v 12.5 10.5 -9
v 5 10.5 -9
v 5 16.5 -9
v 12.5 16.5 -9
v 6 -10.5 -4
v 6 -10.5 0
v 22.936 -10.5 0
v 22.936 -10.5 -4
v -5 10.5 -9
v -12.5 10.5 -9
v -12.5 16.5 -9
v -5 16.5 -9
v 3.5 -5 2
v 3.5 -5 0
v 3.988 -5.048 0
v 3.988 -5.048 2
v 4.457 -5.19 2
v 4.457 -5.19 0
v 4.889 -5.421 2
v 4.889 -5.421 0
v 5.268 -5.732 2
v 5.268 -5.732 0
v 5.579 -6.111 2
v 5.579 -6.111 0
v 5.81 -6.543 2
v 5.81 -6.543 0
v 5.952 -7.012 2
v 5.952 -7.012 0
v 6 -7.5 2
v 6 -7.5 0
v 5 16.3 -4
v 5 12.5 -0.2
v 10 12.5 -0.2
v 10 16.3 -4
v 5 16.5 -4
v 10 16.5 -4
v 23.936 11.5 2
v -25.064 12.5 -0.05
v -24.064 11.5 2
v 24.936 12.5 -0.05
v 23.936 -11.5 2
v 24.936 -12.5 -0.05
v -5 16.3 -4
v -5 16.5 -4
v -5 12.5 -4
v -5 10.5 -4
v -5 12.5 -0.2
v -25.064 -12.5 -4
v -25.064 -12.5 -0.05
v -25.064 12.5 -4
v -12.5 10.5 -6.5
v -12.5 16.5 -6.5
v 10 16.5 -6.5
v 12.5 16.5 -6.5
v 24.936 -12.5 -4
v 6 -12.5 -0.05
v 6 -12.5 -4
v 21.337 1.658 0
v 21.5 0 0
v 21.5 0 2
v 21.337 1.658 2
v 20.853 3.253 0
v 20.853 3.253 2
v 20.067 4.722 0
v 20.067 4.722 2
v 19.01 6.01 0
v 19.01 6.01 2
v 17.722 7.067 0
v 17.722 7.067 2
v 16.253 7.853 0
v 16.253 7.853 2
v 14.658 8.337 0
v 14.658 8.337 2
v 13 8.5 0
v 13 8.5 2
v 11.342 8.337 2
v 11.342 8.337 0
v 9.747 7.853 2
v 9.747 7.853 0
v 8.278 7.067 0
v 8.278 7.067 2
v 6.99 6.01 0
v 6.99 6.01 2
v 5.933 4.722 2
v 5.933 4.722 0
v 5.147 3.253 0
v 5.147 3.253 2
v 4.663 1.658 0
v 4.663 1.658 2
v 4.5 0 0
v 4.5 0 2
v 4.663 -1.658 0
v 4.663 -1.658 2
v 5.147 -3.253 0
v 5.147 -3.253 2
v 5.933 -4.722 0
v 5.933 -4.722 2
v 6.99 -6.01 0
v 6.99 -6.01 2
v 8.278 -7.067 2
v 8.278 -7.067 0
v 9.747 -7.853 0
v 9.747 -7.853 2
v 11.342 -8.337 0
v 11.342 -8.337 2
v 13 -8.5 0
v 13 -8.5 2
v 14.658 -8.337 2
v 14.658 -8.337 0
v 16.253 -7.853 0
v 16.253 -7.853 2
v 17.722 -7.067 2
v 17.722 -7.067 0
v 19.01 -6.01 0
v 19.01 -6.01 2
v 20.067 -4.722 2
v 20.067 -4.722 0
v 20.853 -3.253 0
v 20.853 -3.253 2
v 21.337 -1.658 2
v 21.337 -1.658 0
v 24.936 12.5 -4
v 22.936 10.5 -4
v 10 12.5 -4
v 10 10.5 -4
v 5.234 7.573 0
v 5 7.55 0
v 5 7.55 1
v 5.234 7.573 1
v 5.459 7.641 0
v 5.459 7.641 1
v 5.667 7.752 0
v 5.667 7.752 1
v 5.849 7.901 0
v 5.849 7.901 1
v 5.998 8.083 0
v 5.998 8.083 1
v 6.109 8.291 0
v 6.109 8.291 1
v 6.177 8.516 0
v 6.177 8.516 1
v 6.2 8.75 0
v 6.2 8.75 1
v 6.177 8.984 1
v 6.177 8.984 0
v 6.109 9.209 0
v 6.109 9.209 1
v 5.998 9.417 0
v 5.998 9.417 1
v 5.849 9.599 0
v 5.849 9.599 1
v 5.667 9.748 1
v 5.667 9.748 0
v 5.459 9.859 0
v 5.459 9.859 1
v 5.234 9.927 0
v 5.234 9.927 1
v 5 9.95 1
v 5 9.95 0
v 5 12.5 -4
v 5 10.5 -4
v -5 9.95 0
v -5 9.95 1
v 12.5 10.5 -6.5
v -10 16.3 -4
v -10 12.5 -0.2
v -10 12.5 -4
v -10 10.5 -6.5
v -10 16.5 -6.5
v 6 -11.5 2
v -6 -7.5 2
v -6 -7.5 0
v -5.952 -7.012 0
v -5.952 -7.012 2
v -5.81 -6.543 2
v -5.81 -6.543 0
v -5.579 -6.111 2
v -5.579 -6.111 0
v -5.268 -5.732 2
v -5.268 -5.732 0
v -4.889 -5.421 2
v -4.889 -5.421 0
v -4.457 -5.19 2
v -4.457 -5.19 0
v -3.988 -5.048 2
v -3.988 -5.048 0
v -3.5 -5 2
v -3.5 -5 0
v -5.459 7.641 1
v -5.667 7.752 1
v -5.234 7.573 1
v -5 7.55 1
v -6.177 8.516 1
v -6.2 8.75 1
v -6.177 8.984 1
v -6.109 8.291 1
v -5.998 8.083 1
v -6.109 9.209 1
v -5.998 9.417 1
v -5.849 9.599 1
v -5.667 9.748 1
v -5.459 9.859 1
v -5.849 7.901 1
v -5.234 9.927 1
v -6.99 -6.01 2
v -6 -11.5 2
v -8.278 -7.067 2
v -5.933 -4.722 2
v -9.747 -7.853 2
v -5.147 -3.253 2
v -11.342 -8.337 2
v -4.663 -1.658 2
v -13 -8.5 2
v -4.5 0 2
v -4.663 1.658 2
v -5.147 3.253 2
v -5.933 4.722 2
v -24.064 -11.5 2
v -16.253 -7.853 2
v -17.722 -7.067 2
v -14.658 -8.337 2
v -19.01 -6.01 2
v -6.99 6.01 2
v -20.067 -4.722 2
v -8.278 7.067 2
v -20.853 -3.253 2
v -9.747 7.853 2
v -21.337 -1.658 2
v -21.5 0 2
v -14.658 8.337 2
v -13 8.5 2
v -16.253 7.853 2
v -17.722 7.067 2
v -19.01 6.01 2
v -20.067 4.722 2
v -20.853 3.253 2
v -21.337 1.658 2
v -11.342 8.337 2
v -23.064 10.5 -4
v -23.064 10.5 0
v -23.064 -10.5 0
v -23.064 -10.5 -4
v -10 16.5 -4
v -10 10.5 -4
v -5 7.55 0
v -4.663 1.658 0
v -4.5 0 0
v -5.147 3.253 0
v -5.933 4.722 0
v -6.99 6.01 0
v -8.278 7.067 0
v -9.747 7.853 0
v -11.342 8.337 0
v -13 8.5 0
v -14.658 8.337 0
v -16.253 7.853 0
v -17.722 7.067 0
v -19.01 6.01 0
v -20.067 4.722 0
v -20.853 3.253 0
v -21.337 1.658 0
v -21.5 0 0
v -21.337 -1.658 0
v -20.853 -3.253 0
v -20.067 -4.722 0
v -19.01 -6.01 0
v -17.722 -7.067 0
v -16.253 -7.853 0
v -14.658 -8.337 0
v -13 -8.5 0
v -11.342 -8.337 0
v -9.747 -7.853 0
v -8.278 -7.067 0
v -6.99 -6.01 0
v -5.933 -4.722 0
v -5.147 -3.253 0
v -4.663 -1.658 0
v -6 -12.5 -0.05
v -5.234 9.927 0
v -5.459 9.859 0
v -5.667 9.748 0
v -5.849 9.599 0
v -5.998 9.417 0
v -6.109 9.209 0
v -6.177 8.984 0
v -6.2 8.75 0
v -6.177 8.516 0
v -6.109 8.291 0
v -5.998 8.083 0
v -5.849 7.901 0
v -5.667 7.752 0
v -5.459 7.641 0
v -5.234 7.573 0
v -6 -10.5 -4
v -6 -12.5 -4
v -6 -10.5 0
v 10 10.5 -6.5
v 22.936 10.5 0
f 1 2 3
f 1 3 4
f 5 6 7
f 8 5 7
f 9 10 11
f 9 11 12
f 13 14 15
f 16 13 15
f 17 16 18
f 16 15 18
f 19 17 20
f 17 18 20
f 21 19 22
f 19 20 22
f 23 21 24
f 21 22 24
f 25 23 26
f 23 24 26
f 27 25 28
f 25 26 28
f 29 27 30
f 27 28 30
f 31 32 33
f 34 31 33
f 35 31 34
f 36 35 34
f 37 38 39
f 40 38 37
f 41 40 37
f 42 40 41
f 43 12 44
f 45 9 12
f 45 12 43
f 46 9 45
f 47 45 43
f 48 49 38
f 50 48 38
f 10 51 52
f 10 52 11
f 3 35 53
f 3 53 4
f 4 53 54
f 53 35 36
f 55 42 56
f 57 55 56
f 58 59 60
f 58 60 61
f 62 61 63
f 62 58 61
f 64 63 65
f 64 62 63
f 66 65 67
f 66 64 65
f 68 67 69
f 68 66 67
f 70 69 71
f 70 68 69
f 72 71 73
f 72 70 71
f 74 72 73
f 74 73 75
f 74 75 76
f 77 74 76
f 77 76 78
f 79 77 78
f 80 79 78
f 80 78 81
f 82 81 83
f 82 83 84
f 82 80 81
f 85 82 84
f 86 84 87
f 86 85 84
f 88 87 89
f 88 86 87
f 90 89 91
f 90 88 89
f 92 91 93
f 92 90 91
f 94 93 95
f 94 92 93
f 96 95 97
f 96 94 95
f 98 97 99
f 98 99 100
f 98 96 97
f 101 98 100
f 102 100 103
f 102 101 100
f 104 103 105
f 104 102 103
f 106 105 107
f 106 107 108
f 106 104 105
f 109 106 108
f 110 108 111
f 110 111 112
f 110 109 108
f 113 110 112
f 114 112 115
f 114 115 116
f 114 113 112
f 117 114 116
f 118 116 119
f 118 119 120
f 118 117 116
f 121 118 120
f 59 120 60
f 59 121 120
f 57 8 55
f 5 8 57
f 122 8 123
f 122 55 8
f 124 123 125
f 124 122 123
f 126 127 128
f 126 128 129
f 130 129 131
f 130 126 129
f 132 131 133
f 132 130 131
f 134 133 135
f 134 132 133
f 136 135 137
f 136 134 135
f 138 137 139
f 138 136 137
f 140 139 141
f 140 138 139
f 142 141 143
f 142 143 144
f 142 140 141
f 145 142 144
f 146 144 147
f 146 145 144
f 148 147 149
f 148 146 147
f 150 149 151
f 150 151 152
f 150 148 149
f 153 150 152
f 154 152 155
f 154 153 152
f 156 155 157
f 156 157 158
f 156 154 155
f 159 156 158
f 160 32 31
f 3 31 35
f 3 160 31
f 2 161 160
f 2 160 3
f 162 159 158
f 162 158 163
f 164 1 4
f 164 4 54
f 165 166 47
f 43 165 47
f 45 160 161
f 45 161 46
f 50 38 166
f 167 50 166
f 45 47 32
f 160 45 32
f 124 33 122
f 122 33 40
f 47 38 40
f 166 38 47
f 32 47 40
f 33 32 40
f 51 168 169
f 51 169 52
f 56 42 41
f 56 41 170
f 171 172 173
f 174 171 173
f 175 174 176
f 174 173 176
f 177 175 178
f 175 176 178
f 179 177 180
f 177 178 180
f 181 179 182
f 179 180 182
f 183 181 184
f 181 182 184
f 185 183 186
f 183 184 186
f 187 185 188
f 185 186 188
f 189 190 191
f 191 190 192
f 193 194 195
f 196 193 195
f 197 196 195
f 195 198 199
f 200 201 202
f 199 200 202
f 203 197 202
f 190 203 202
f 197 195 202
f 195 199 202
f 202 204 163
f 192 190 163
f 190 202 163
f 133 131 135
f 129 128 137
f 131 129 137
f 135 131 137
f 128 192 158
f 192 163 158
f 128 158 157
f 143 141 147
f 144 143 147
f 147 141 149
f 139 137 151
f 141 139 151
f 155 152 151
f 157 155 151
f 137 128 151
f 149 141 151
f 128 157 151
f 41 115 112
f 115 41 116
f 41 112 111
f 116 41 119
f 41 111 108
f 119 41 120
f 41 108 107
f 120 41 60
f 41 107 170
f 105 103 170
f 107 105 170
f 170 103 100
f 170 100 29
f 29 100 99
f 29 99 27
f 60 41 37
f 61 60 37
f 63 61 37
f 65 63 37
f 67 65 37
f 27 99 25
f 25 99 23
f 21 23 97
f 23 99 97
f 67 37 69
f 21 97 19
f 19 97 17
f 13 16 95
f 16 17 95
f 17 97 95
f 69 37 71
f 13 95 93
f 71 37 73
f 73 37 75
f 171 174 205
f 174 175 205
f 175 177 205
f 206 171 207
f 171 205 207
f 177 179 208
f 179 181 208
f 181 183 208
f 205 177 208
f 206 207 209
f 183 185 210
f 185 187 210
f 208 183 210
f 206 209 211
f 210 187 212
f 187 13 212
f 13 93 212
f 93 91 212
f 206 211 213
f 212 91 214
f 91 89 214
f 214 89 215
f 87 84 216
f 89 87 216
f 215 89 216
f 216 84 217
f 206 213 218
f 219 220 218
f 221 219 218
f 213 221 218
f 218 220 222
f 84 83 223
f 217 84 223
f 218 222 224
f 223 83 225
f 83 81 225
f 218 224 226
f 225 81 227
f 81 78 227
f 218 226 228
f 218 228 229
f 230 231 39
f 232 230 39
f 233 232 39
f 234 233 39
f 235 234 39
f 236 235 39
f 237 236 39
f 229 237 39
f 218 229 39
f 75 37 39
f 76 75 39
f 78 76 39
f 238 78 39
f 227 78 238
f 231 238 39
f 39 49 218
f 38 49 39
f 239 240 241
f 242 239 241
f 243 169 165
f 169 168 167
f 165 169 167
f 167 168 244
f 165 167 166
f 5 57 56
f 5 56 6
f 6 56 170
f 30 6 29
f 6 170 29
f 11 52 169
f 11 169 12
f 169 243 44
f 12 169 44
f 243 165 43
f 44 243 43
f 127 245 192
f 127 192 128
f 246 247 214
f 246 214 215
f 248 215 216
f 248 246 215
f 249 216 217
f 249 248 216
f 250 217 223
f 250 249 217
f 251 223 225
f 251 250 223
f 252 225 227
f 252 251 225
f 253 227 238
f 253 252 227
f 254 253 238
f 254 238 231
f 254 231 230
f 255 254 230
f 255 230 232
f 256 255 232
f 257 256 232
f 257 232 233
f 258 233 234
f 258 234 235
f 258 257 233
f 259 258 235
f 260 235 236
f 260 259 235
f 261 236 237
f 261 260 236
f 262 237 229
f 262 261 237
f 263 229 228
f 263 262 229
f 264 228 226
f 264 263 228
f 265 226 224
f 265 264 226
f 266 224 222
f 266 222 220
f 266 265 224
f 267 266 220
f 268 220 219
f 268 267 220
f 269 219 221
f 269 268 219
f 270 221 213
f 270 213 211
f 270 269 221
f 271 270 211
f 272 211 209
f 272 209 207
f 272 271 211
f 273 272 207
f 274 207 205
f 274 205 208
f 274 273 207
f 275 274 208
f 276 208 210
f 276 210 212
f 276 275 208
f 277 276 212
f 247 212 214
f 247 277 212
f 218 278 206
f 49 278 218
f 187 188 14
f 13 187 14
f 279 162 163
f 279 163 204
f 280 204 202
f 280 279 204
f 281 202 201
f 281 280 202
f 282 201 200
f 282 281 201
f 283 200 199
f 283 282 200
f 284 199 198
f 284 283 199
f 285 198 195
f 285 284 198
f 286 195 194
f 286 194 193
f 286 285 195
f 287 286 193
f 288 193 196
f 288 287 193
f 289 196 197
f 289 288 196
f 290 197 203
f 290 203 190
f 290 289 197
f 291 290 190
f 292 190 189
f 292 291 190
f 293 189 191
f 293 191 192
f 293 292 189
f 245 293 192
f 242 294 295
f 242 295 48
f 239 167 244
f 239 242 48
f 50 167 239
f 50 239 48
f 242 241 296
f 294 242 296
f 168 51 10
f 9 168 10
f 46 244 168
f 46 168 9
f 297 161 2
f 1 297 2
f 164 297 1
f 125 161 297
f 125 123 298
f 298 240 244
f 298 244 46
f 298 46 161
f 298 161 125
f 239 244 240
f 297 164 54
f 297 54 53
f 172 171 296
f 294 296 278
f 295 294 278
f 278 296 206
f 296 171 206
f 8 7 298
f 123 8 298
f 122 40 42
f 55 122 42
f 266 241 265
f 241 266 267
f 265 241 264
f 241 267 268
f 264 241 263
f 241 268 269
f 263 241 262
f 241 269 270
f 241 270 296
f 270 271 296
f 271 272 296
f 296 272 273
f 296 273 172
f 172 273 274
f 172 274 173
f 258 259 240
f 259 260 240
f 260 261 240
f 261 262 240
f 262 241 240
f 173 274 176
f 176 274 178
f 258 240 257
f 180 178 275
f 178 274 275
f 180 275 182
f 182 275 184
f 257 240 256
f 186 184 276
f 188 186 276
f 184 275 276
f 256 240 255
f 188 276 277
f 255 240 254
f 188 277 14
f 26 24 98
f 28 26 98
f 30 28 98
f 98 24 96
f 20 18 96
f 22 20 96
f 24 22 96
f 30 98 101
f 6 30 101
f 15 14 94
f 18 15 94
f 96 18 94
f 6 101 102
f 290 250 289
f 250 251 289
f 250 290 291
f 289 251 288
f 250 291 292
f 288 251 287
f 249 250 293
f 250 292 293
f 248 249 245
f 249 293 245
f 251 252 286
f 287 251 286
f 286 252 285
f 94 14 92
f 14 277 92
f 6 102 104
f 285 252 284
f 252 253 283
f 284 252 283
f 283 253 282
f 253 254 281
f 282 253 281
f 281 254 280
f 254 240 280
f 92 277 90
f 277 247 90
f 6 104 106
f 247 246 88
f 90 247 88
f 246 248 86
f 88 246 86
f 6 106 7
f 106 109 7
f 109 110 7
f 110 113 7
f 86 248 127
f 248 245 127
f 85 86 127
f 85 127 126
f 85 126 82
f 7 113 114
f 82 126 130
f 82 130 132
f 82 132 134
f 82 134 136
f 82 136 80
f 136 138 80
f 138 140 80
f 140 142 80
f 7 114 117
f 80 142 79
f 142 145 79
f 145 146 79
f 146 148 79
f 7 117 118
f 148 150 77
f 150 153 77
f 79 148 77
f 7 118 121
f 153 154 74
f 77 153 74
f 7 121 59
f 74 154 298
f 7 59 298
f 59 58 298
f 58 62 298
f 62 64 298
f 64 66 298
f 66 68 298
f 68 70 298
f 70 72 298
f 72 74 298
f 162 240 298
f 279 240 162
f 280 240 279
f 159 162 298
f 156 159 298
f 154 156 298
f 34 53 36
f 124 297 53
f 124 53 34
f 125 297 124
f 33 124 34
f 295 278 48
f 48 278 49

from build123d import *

# Parameters (mm, degrees)
SKETCH1_R                = 8.5
BOSS_EXTRUDE1_DEPTH      = 2
BOSS_EXTRUDE2_DEPTH      = 4
BOSS_EXTRUDE2_DEPTH_BACK = 2
CHAMFER1_SIZE            = 1
CHAMFER1_SIZE2           = 2.050303842
CUT_EXTRUDE1_DEPTH       = 1
SKETCH5_W                = 5
SKETCH5_H                = 2.5
BOSS_EXTRUDE3_DEPTH      = 6
CHAMFER2_SIZE            = 3.8


with BuildPart() as part:
    # Sketch1 → Boss-Extrude1 (new body)
    # profile 1 of 2: a face of its own
    with BuildSketch(Plane.XY):
        with BuildLine():
            Line((-22.564385508, -10.000007952), (-6, -10.000007952))
            Line((-6, -10.000007952), (-6, -7.5))
            ThreePointArc((-6, -7.5), (-5.267766953, -5.732233047), (-3.5, -5))
            Line((-3.5, -5), (3.5, -5))
            ThreePointArc((3.5, -5), (5.267766953, -5.732233047), (6, -7.5))
            Line((6, -7.5), (6, -10.000007952))
            Line((6, -10.000007952), (22.435614492, -10.000007952))
            Line((22.435614492, -10.000007952), (22.435614492, 9.999992048))
            Line((22.435614492, 9.999992048), (-22.564385508, 9.999992048))
            Line((-22.564385508, 9.999992048), (-22.564385508, -10.000007952))
        make_face()
        with Locations((-13, 0)):
            Circle(SKETCH1_R, mode=Mode.SUBTRACT)
        with Locations((13, 0)):
            Circle(SKETCH1_R, mode=Mode.SUBTRACT)
    # profile 2 of 2: a face of its own
    with BuildSketch(Plane.XY):
        Polygon((-6, -10.500007952), (-6, -10.000007952), (-22.564385508, -10.000007952), (-22.564385508, 9.999992048), (22.435614492, 9.999992048), (22.435614492, -10.000007952), (6, -10.000007952), (6, -10.500007952), (22.935614492, -10.500007952), (22.935614492, 10.499992048), (-23.064385508, 10.499992048), (-23.064385508, -10.500007952), align=None)
    extrude(amount=BOSS_EXTRUDE1_DEPTH)

    # Sketch2 → Boss-Extrude2 (add, two sides: drawn at the far end of the back side and taken through both)
    with BuildSketch(Plane(origin=(0, 0, 0), x_dir=(-1, 0, 0), z_dir=(0, 0, -1)).offset(-BOSS_EXTRUDE2_DEPTH_BACK)):
        Polygon((6, -12.500007952), (25.064385508, -12.500007952), (25.064385508, 12.499992048), (-24.935614492, 12.499992048), (-24.935614492, -12.500007952), (-6, -12.500007952), (-6, -10.500007952), (-22.935614492, -10.500007952), (-22.935614492, 10.499992048), (23.064385508, 10.499992048), (23.064385508, -10.500007952), (6, -10.500007952), align=None)
    extrude(amount=BOSS_EXTRUDE2_DEPTH + BOSS_EXTRUDE2_DEPTH_BACK)

    # Chamfer1
    chamfer1_edges = [part.edges().sort_by_distance(p)[0] for p in [
        (-15.532192754, -12.500007952, 2),
        (-25.064385508, -7.952e-06, 2),
        (-0.064385508, 12.499992048, 2),
        (24.935614492, -7.952e-06, 2),
        (15.467807246, -12.500007952, 2),
    ]]
    chamfer1_side = [part.faces().sort_by_distance(p)[0] for p in [
        (-0.113559128, 1.090103523, 2),
    ]]
    chamfer(chamfer1_edges, length=CHAMFER1_SIZE, length2=CHAMFER1_SIZE2, reference=chamfer1_side[0])

    # Sketch3 → Cut-Extrude1 (cut)
    with BuildSketch(Plane(origin=(0, 0, 0), x_dir=(-1, 0, 0), z_dir=(0, 0, -1))):
        with BuildLine():
            Line((-5, 9.949992048), (5, 9.949992048))
            ThreePointArc((5, 9.949992048), (6.2, 8.749992048), (5, 7.549992048))
            Line((5, 7.549992048), (-5, 7.549992048))
            ThreePointArc((-5, 7.549992048), (-6.2, 8.749992048), (-5, 9.949992048))
        make_face()
    extrude(amount=-CUT_EXTRUDE1_DEPTH, mode=Mode.SUBTRACT)

    # Sketch5 → Boss-Extrude3 (add)
    with BuildSketch(Plane.XZ.offset(-10.499992048)):
        with Locations((7.5, -5.25)):
            Rectangle(SKETCH5_W, SKETCH5_H)
        Polygon((10, -6.5), (5, -6.5), (5, -9), (12.5, -9), (12.5, -6.5), align=None)
        with Locations((-7.5, -5.25)):
            Rectangle(SKETCH5_W, SKETCH5_H)
        Polygon((-5, -9), (-5, -6.5), (-10, -6.5), (-12.5, -6.5), (-12.5, -9), align=None)
    extrude(amount=-BOSS_EXTRUDE3_DEPTH)

    # Chamfer2
    chamfer2_edges = [part.edges().sort_by_distance(p)[0] for p in [
        (7.5, 12.499992048, -4),
        (-7.5, 12.499992048, -4),
    ]]
    chamfer(chamfer2_edges, length=CHAMFER2_SIZE)


solid = part.part
